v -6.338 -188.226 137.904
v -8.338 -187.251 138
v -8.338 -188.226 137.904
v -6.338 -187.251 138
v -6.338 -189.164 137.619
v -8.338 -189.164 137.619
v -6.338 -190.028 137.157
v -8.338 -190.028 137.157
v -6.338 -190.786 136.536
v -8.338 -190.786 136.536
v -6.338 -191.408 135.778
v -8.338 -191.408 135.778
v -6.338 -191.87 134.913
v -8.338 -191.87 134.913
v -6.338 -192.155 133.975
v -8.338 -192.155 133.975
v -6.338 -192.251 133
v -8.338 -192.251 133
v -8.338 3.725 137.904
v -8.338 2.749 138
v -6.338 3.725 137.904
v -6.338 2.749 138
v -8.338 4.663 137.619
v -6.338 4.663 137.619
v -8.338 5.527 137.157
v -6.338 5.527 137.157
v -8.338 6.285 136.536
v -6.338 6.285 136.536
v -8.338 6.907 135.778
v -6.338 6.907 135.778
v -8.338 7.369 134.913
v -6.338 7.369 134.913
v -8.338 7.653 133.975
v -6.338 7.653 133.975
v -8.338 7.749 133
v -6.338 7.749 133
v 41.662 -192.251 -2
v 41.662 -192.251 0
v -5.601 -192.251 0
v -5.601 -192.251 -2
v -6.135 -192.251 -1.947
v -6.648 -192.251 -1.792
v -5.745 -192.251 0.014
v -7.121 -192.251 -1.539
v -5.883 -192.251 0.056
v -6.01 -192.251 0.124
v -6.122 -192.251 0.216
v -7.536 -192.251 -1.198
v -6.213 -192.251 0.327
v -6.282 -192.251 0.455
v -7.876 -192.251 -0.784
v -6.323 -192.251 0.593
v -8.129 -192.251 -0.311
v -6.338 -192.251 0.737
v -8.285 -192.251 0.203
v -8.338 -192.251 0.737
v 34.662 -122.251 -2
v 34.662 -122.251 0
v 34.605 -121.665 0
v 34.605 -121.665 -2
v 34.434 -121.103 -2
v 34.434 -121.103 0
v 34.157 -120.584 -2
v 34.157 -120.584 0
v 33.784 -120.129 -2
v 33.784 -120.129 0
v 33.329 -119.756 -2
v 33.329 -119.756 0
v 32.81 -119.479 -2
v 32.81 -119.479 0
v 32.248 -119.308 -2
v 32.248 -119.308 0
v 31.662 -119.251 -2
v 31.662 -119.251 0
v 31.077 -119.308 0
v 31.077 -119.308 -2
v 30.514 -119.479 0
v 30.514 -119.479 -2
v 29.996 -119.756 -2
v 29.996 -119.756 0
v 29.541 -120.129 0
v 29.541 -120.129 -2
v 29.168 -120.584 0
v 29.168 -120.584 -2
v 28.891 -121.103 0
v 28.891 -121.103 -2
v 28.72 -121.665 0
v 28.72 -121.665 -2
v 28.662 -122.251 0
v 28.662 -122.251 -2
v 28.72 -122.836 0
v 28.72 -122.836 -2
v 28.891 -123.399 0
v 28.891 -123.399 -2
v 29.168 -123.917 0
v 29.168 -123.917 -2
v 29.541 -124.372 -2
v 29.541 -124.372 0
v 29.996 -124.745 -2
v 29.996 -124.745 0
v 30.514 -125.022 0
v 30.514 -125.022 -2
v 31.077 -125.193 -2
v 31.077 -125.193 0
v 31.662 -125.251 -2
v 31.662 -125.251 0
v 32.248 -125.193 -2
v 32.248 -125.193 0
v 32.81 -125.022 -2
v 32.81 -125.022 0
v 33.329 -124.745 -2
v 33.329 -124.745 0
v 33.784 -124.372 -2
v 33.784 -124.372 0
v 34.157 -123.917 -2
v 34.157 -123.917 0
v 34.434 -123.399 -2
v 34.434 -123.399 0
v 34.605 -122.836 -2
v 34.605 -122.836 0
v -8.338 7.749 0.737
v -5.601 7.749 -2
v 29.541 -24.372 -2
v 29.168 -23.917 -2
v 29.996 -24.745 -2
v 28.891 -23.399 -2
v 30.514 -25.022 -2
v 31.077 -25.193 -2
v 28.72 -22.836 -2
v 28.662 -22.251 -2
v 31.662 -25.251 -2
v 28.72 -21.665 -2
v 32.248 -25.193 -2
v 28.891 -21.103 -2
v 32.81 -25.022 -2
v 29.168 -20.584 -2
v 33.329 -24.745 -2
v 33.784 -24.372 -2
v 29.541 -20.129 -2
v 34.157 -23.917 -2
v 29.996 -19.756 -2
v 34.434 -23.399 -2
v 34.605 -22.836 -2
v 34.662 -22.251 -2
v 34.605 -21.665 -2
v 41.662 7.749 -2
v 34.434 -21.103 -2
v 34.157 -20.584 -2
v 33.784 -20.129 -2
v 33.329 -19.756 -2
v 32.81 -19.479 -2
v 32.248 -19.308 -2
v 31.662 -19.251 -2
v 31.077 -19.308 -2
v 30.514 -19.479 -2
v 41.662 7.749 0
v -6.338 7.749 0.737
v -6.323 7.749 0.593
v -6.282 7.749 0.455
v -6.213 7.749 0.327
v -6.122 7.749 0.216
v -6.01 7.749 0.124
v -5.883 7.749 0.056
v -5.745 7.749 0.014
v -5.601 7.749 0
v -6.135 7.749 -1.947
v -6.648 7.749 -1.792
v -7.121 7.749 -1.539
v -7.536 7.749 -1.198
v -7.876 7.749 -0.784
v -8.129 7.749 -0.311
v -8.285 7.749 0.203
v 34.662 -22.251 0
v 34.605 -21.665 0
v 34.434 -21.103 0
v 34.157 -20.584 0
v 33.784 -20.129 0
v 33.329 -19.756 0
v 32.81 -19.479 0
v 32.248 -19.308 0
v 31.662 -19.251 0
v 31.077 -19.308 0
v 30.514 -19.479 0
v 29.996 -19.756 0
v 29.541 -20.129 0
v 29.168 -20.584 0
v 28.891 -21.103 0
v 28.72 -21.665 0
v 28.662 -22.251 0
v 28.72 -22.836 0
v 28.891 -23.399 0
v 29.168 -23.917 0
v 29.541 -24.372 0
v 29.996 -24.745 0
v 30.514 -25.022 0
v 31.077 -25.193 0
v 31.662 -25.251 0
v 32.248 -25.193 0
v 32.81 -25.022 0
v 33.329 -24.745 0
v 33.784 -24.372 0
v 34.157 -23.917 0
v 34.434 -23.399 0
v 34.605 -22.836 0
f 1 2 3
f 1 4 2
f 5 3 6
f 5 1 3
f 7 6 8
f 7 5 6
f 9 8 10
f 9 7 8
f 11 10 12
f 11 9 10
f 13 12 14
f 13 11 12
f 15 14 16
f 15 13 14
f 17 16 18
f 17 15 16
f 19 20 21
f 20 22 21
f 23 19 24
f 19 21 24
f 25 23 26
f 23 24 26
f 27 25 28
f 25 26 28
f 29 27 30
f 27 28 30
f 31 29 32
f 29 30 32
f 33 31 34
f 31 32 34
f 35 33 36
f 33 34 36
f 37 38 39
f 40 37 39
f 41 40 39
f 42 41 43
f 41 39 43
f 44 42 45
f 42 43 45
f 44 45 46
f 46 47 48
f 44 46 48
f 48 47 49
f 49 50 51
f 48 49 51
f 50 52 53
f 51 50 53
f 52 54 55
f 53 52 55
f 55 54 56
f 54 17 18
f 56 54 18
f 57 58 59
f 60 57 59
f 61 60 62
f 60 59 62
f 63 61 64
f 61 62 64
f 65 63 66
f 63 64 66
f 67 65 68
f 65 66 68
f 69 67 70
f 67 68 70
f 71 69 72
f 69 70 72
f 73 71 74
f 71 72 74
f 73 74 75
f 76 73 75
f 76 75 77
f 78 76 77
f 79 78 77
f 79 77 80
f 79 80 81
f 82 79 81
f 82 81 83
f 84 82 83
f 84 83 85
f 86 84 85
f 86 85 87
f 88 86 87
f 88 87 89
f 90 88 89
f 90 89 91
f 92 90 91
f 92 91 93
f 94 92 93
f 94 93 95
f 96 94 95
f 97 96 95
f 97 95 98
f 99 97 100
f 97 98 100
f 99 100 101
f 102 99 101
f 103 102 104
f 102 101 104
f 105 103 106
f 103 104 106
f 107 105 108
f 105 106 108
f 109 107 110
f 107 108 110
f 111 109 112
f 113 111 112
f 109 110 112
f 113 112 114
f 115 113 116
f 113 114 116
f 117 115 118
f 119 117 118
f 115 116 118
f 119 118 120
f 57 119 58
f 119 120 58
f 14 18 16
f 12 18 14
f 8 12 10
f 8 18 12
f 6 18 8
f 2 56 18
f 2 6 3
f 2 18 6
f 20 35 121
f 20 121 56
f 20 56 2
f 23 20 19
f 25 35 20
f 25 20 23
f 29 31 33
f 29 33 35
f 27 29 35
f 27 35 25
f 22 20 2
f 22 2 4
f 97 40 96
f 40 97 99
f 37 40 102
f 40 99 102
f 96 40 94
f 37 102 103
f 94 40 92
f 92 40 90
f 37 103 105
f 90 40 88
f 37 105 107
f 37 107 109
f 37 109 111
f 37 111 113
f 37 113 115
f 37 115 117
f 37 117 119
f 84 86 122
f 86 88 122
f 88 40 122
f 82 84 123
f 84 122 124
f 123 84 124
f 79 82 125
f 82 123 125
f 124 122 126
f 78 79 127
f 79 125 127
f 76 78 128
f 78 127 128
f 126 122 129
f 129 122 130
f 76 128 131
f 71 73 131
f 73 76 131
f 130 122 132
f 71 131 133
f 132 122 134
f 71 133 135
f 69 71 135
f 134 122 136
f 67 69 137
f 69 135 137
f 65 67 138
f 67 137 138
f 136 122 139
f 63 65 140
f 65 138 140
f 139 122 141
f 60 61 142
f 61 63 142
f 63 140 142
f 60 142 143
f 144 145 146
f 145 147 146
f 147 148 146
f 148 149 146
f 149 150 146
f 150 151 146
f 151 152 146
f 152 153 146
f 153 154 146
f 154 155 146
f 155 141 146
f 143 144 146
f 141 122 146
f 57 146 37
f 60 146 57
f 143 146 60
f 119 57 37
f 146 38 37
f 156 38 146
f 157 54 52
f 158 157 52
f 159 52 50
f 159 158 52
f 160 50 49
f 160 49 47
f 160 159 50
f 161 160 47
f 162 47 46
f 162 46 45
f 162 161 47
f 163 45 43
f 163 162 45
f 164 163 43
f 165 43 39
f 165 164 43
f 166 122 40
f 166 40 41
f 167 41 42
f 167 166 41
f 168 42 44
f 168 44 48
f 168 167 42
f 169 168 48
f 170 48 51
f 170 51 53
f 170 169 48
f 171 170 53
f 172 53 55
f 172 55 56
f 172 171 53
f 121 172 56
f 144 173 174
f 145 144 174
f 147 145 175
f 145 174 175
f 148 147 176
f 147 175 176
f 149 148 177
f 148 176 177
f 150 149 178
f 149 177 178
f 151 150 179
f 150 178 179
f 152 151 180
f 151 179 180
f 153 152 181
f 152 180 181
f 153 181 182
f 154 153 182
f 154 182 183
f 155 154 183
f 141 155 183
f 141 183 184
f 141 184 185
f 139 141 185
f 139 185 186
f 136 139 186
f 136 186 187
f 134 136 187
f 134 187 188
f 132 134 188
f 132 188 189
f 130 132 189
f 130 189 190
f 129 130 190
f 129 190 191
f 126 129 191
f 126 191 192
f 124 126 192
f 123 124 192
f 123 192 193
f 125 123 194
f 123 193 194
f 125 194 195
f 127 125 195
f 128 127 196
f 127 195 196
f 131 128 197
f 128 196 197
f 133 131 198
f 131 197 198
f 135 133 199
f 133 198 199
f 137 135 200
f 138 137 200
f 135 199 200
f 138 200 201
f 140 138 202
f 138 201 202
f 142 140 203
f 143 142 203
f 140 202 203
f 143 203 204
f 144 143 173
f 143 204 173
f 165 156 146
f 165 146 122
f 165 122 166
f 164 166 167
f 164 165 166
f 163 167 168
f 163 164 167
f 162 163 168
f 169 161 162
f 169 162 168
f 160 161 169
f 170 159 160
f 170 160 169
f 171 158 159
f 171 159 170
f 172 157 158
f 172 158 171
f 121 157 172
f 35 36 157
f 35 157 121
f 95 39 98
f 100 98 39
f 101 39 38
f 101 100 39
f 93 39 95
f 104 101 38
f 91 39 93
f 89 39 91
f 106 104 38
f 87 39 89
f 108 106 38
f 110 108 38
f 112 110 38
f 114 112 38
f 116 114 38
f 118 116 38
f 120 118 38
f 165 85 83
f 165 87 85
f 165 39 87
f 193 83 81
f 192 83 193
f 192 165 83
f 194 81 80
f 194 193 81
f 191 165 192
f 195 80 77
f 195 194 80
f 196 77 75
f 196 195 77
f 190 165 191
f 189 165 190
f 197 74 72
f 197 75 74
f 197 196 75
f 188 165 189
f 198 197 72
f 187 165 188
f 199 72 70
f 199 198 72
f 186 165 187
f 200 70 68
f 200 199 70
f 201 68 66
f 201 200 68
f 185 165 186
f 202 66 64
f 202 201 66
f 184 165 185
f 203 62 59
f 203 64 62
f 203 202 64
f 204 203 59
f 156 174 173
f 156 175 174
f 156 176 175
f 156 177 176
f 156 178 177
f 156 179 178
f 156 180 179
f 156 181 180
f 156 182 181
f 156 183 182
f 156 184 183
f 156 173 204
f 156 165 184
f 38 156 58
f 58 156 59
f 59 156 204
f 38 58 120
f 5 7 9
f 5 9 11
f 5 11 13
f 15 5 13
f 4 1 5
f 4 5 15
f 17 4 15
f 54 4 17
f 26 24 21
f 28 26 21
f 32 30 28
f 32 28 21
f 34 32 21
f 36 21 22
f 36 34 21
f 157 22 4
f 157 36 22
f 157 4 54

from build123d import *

# Parameters (mm, degrees)
SKETCH_1_W                       = 50
SKETCH_1_H                       = 200
SM_BASE_FLANGE_1_DEPTH           = 2
SM_EDGE_FLANGE_1_STRIP_W         = 9.4732
SM_EDGE_FLANGE_1_STRIP_H         = 2
SM_EDGE_FLANGE_1_STRIP_CUT_DEPTH = 200
SM_EDGE_FLANGE_1_DEPTH           = 200
SKETCH_8_R                       = 3
CUT_EXTRUDE_1_DEPTH              = 10
PATTERN_LINEAR_1_COUNT           = 2
PATTERN_LINEAR_1_PITCH           = 100
FILLET_2_R                       = 5
FILLET_3_R                       = 5


# Sheet-metal steps are written as plain solids
with BuildPart() as part:
    # Sketch 1 → 基体-法兰1 (new body)
    with BuildSketch(Plane.XY):
        with Locations((16.662404092, -92.250639386)):
            Rectangle(SKETCH_1_W, SKETCH_1_H)
    extrude(amount=-SM_BASE_FLANGE_1_DEPTH)

    # 边线-法兰1 strip (across the edge) → 边线-法兰1 strip cut (cut)
    with BuildSketch(Plane(origin=(-8.337595908, 7.749360614, 0), x_dir=(1, 0, 0), z_dir=(0, -1, 0))):
        with Locations((-2, -1)):
            Rectangle(SM_EDGE_FLANGE_1_STRIP_W, SM_EDGE_FLANGE_1_STRIP_H)
    extrude(amount=SM_EDGE_FLANGE_1_STRIP_CUT_DEPTH, mode=Mode.SUBTRACT)

    # 边线-法兰1 section (across the edge) → 边线-法兰1 (add)
    with BuildSketch(Plane(origin=(-8.337595908, 7.749360614, 0), x_dir=(1, 0, 0), z_dir=(0, -1, 0))):
        with BuildLine():
            Line((0, 0.7366), (0, 138))
            Line((0, 138), (2, 138))
            Line((2, 138), (2, 0.7366))
            ThreePointArc((2, 0.7366), (2.215745145, 0.215745145), (2.7366, 0))
            Line((2.7366, 0), (2.7366, -2))
            ThreePointArc((2.7366, -2), (0.801531583, -1.198468417), (0, 0.7366))
        make_face()
    extrude(amount=SM_EDGE_FLANGE_1_DEPTH)

    # 草图8 → 切除-拉伸1 (cut)
    with BuildSketch(Plane.XY):
        with Locations((31.662404092, -22.250639386)):
            Circle(SKETCH_8_R)
    cut_extrude_1 = extrude(amount=-CUT_EXTRUDE_1_DEPTH, mode=Mode.SUBTRACT)

    # 阵列(线性)1: 切除-拉伸1 ×2
    with Locations(*[(0, -i * PATTERN_LINEAR_1_PITCH, 0) for i in range(1, PATTERN_LINEAR_1_COUNT)]):
        add(cut_extrude_1, mode=Mode.SUBTRACT)

    # 圆角2
    fillet_2_edges = [part.edges().sort_by_distance(p)[0] for p in [
        (-7.337595908, 7.749360614, 138),
    ]]
    fillet(fillet_2_edges, radius=FILLET_2_R)

    # 圆角3
    fillet_3_edges = [part.edges().sort_by_distance(p)[0] for p in [
        (-7.337595908, -192.250639386, 138),
    ]]
    fillet(fillet_3_edges, radius=FILLET_3_R)


solid = part.part
